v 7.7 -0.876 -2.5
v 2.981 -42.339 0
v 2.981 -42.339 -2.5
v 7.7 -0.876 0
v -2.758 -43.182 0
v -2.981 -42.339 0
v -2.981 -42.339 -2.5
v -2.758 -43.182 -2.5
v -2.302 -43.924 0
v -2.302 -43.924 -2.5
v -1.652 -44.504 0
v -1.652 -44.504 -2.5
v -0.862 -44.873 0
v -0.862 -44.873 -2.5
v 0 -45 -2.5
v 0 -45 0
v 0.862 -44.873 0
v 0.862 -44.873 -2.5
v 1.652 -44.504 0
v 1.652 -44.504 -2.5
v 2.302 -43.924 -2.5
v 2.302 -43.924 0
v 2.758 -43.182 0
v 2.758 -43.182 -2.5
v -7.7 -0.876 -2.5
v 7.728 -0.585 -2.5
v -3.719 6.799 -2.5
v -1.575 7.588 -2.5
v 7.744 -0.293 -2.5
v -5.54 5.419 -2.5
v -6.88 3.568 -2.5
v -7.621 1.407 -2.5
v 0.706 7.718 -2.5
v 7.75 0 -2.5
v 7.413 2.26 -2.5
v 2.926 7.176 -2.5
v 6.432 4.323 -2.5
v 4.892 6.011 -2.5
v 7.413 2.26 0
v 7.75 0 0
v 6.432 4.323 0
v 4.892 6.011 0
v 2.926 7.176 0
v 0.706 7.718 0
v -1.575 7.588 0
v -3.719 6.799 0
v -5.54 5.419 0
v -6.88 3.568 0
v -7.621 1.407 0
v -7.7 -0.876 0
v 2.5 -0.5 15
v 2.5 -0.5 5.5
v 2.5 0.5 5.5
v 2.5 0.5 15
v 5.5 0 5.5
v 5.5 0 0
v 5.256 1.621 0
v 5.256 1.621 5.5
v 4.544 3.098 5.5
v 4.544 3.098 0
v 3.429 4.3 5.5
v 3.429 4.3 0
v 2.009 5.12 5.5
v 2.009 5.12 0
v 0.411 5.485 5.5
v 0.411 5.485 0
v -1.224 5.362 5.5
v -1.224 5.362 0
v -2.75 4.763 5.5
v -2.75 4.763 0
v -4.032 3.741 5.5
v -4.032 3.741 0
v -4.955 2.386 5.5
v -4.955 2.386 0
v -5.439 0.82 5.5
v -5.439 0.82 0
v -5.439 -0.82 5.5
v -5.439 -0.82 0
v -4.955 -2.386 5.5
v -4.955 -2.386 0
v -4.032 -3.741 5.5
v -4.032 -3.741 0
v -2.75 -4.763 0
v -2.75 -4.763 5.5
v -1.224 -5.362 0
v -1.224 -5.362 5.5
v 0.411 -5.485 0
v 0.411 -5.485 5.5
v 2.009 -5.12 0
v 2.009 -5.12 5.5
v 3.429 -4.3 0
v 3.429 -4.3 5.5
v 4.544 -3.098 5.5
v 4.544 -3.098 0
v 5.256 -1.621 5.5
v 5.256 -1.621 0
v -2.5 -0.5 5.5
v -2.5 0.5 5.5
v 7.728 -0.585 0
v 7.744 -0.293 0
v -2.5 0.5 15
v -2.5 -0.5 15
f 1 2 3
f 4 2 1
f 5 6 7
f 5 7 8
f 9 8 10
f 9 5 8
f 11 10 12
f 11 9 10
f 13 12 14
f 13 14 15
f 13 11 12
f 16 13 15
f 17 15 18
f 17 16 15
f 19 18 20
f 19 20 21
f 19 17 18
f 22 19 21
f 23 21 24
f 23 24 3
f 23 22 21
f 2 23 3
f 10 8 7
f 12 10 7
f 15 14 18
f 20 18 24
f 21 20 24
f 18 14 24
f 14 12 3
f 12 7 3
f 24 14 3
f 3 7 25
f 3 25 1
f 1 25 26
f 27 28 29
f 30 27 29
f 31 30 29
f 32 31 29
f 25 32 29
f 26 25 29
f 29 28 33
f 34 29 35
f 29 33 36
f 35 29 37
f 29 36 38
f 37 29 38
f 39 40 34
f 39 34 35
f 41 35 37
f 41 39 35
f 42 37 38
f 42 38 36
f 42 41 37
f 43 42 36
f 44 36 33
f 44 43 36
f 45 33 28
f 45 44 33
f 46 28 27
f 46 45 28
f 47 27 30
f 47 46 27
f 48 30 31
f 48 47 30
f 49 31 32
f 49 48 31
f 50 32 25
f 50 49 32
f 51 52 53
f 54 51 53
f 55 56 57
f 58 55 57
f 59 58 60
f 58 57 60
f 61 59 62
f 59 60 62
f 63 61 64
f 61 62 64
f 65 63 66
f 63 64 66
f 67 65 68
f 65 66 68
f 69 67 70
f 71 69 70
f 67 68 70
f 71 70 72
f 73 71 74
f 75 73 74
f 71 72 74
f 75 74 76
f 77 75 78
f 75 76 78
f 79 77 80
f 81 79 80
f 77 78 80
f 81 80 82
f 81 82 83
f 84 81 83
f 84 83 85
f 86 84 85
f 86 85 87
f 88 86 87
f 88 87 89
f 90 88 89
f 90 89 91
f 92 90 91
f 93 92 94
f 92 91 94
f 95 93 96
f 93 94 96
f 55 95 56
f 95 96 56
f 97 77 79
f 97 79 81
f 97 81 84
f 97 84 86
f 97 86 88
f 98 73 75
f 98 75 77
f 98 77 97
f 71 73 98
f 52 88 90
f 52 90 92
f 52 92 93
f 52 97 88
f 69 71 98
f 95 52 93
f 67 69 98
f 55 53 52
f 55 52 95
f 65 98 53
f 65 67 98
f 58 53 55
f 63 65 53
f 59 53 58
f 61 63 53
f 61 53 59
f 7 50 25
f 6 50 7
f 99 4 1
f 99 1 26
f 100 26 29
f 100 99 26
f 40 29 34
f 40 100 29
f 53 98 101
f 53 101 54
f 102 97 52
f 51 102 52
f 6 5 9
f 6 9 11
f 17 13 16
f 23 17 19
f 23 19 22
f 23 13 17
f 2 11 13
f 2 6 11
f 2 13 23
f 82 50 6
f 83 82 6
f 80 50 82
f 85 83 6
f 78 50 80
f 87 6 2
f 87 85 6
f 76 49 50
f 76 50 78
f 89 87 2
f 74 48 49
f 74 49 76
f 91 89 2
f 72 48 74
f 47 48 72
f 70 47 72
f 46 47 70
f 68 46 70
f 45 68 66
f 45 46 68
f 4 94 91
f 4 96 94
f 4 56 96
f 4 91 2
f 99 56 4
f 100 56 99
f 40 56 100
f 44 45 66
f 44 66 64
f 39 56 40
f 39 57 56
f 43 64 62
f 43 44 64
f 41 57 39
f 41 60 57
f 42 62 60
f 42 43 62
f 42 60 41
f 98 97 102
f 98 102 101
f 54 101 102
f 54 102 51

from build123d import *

# Parameters (mm, degrees)
F0_W     = 5
F0_H     = 1
F1_DEPTH = 15
F0_R     = 5.5
F2_DEPTH = 5.5
F3_DEPTH = 2.5


with BuildPart() as f1:
    # F0 (on Top) → F1 (new body)
    with BuildSketch(Plane.XY):
        Rectangle(F0_W, F0_H)
    extrude(amount=F1_DEPTH)

    # F0 (on Top) → F2 (join)
    with BuildSketch(Plane.XY):
        Circle(F0_R)
        Rectangle(F0_W, F0_H, mode=Mode.SUBTRACT)
    extrude(amount=F2_DEPTH)

    # F0 (on Top) → F3 (join)
    with BuildSketch(Plane.XY):
        with BuildLine():
            ThreePointArc((7.7002771781, -0.8764880952), (0, -7.75), (-7.7002771781, -0.8764880952))
            Line((-7.7002771781, -0.8764880952), (-2.980752456, -42.3392857143))
            ThreePointArc((-2.980752456, -42.3392857143), (-0.1699156143, -39.0048157512), (3, -42))
            ThreePointArc((3, -42), (2.9951842488, -42.1699156143), (2.980752456, -42.3392857143))
            Line((2.980752456, -42.3392857143), (7.7002771781, -0.8764880952))
        make_face()
        with BuildLine():
            ThreePointArc((7.7002771781, -0.8764880952), (7.7375593093, -0.4389486702), (7.75, 0))
            ThreePointArc((7.75, 0), (-0.4389486702, 7.7375593093), (-7.7002771781, -0.8764880952))
            ThreePointArc((-7.7002771781, -0.8764880952), (0, -7.75), (7.7002771781, -0.8764880952))
        make_face()
        Circle(F0_R, mode=Mode.SUBTRACT)
        Circle(F0_R)
        Rectangle(F0_W, F0_H, mode=Mode.SUBTRACT)
        with BuildLine():
            ThreePointArc((3, -42), (-0.1699156143, -39.0048157512), (-2.980752456, -42.3392857143))
            ThreePointArc((-2.980752456, -42.3392857143), (0, -45), (2.980752456, -42.3392857143))
            ThreePointArc((2.980752456, -42.3392857143), (2.9951842488, -42.1699156143), (3, -42))
        make_face()
        Rectangle(F0_W, F0_H)
    extrude(amount=-F3_DEPTH)


solid = f1.part
